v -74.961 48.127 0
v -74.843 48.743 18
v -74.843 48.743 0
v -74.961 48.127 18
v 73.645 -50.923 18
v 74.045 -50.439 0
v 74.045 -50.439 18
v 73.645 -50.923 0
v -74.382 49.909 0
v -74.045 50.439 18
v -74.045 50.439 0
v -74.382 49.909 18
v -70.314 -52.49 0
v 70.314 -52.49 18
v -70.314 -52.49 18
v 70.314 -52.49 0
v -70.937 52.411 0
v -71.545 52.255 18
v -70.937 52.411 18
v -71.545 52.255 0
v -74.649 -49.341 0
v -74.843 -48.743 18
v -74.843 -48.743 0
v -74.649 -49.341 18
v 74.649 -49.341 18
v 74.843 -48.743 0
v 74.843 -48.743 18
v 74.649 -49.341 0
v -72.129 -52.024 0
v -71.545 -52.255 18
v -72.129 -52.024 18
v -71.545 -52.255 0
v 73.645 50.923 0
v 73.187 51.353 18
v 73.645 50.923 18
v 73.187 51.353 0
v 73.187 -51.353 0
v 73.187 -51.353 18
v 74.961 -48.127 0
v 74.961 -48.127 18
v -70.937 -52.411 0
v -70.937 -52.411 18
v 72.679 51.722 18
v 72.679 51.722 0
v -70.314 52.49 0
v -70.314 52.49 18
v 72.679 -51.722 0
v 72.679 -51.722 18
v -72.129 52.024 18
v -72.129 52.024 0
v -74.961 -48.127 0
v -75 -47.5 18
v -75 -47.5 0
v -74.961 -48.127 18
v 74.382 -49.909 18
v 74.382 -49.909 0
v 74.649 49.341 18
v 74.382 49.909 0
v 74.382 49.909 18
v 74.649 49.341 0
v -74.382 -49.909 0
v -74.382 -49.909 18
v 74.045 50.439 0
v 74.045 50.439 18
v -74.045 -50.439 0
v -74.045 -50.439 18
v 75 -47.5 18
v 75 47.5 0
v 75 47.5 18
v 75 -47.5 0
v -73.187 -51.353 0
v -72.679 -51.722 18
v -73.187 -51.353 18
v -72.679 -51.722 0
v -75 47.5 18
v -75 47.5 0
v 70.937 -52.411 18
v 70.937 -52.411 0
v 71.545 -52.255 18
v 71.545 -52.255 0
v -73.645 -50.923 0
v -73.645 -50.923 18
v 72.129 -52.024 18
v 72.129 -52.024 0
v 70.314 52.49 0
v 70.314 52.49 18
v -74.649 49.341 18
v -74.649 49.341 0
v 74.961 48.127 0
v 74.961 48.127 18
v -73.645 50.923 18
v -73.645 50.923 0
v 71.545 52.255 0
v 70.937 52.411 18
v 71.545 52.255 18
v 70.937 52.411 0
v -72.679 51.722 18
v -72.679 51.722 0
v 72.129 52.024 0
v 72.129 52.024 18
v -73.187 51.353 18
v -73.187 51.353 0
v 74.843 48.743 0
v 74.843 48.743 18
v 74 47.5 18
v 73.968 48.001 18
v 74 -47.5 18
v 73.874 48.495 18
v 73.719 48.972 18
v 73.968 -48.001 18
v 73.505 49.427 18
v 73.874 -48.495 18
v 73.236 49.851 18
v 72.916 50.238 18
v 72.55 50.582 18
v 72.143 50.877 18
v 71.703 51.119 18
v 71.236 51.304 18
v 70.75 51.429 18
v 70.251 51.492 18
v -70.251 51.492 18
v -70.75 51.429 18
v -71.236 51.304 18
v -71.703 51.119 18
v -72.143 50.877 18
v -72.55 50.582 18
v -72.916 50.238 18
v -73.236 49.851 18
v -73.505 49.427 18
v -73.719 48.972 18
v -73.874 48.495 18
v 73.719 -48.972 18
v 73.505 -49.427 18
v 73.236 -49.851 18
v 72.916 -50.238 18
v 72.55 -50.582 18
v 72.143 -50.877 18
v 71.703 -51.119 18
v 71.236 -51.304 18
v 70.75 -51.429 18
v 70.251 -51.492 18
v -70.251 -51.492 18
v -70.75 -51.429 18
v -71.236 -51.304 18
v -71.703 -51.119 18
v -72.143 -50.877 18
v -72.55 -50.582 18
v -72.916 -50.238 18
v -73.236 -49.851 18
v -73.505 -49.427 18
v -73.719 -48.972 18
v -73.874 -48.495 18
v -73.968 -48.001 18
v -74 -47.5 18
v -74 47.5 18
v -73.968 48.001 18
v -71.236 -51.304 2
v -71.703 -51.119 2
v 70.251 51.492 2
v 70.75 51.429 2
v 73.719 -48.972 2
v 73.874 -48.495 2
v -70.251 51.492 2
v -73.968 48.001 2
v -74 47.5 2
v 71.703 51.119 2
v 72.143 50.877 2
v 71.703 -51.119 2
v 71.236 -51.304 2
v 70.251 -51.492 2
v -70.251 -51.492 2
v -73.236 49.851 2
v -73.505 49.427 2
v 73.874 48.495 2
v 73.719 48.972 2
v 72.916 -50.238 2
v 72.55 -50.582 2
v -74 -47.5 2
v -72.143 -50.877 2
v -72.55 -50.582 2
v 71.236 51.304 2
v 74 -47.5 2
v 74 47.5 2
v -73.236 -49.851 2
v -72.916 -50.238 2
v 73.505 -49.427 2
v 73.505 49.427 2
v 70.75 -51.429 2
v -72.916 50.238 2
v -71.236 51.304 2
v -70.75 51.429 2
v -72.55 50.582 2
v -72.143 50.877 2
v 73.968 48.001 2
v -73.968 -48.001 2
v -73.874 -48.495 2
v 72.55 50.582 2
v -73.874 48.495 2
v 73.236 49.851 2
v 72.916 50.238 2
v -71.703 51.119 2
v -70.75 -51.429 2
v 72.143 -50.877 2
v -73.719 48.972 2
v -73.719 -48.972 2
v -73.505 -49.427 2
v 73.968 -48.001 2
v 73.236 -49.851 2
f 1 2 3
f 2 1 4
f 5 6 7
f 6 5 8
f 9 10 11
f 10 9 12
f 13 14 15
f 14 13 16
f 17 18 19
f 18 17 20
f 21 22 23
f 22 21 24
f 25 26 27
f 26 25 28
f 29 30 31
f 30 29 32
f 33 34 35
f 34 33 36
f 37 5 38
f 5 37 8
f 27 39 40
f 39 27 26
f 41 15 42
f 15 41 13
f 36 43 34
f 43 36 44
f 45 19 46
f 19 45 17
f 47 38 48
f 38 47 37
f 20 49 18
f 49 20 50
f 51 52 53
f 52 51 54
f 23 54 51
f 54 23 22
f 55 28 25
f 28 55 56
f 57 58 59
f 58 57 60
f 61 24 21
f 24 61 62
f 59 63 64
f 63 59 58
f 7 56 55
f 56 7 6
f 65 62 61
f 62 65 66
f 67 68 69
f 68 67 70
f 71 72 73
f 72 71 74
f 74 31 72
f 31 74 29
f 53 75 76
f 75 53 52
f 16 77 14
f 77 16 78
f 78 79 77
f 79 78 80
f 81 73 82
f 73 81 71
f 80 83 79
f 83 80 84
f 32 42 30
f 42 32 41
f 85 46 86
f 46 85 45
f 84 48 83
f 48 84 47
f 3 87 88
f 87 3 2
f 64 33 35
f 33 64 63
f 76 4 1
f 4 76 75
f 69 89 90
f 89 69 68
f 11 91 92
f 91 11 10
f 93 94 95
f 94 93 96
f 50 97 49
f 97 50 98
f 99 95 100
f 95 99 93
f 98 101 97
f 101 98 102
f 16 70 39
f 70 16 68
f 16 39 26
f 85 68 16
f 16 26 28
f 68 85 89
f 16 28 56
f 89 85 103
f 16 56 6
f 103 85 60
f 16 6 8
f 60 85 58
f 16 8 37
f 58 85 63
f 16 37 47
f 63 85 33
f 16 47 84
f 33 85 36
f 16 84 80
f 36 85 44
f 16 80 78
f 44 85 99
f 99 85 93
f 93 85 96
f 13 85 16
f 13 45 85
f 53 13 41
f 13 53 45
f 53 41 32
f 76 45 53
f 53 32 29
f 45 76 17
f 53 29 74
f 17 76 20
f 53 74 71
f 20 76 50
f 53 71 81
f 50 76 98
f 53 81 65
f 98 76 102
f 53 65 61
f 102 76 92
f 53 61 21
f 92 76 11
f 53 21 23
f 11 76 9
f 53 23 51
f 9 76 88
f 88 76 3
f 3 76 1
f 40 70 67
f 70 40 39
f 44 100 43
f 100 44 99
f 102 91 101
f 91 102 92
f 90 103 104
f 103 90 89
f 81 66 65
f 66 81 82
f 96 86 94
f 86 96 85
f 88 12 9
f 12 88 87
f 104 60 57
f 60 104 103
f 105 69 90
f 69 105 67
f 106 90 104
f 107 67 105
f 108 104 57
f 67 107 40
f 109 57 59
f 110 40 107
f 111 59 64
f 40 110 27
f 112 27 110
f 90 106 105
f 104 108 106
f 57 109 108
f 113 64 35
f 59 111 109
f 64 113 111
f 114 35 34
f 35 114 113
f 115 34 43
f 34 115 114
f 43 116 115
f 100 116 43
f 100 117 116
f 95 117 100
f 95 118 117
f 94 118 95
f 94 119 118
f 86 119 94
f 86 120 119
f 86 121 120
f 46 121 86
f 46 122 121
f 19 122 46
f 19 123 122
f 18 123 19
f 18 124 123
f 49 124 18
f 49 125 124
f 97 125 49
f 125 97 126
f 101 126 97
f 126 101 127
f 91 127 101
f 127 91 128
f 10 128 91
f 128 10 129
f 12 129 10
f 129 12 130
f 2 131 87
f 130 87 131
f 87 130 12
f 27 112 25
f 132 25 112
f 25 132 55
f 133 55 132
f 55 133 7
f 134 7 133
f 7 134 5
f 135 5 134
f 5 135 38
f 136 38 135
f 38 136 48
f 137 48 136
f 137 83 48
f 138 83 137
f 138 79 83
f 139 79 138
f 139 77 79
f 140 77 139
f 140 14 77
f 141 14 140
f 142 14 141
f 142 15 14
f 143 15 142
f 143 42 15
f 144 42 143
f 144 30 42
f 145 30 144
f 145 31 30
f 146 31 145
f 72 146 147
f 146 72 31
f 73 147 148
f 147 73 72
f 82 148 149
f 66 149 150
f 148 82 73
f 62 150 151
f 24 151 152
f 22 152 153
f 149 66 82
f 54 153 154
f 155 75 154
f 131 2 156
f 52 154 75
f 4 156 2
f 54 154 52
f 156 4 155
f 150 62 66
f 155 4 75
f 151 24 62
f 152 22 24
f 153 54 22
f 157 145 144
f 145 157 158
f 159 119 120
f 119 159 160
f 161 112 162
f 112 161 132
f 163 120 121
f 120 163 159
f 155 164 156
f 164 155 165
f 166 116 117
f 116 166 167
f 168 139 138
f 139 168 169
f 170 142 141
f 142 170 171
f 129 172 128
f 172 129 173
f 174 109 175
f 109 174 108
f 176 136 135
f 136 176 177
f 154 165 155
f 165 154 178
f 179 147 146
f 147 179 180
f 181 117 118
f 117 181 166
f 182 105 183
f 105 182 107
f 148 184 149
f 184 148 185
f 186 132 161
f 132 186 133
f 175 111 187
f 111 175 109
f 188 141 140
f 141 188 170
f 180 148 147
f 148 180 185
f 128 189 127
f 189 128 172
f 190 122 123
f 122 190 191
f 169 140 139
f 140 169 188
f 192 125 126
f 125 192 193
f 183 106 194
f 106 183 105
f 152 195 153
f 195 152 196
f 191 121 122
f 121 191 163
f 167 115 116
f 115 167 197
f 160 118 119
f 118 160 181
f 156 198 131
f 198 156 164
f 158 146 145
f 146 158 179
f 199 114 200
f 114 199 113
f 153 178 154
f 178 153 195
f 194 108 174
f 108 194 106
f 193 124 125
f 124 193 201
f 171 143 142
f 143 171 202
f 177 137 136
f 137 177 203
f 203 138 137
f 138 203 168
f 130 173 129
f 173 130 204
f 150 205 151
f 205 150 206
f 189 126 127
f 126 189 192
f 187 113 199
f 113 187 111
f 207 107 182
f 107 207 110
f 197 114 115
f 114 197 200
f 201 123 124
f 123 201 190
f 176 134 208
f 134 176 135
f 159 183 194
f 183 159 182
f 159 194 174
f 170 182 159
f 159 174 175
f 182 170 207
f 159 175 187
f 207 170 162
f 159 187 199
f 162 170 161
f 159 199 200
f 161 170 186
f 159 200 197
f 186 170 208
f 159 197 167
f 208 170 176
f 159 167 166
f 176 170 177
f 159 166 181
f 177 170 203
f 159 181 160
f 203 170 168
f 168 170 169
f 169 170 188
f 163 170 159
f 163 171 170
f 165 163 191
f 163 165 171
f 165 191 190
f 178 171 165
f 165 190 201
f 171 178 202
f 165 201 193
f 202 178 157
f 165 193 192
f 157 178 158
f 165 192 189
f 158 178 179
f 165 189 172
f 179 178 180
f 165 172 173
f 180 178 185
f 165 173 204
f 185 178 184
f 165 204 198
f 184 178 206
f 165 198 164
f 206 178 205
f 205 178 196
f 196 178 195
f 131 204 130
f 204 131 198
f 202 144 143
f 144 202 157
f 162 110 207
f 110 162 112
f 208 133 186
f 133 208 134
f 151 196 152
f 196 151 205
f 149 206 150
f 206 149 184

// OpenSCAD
$fn = 50;


difference() {
	union() {
		hull() {
			translate(v = [-70.0000000000, 47.5000000000, 0]) {
				cylinder(h = 18, r = 5);
			}
			translate(v = [70.0000000000, 47.5000000000, 0]) {
				cylinder(h = 18, r = 5);
			}
			translate(v = [-70.0000000000, -47.5000000000, 0]) {
				cylinder(h = 18, r = 5);
			}
			translate(v = [70.0000000000, -47.5000000000, 0]) {
				cylinder(h = 18, r = 5);
			}
		}
	}
	union() {
		translate(v = [0, 0, 2]) {
			hull() {
				translate(v = [-70.0000000000, 47.5000000000, 0]) {
					cylinder(h = 16, r = 4);
				}
				translate(v = [70.0000000000, 47.5000000000, 0]) {
					cylinder(h = 16, r = 4);
				}
				translate(v = [-70.0000000000, -47.5000000000, 0]) {
					cylinder(h = 16, r = 4);
				}
				translate(v = [70.0000000000, -47.5000000000, 0]) {
					cylinder(h = 16, r = 4);
				}
			}
		}
	}
}
